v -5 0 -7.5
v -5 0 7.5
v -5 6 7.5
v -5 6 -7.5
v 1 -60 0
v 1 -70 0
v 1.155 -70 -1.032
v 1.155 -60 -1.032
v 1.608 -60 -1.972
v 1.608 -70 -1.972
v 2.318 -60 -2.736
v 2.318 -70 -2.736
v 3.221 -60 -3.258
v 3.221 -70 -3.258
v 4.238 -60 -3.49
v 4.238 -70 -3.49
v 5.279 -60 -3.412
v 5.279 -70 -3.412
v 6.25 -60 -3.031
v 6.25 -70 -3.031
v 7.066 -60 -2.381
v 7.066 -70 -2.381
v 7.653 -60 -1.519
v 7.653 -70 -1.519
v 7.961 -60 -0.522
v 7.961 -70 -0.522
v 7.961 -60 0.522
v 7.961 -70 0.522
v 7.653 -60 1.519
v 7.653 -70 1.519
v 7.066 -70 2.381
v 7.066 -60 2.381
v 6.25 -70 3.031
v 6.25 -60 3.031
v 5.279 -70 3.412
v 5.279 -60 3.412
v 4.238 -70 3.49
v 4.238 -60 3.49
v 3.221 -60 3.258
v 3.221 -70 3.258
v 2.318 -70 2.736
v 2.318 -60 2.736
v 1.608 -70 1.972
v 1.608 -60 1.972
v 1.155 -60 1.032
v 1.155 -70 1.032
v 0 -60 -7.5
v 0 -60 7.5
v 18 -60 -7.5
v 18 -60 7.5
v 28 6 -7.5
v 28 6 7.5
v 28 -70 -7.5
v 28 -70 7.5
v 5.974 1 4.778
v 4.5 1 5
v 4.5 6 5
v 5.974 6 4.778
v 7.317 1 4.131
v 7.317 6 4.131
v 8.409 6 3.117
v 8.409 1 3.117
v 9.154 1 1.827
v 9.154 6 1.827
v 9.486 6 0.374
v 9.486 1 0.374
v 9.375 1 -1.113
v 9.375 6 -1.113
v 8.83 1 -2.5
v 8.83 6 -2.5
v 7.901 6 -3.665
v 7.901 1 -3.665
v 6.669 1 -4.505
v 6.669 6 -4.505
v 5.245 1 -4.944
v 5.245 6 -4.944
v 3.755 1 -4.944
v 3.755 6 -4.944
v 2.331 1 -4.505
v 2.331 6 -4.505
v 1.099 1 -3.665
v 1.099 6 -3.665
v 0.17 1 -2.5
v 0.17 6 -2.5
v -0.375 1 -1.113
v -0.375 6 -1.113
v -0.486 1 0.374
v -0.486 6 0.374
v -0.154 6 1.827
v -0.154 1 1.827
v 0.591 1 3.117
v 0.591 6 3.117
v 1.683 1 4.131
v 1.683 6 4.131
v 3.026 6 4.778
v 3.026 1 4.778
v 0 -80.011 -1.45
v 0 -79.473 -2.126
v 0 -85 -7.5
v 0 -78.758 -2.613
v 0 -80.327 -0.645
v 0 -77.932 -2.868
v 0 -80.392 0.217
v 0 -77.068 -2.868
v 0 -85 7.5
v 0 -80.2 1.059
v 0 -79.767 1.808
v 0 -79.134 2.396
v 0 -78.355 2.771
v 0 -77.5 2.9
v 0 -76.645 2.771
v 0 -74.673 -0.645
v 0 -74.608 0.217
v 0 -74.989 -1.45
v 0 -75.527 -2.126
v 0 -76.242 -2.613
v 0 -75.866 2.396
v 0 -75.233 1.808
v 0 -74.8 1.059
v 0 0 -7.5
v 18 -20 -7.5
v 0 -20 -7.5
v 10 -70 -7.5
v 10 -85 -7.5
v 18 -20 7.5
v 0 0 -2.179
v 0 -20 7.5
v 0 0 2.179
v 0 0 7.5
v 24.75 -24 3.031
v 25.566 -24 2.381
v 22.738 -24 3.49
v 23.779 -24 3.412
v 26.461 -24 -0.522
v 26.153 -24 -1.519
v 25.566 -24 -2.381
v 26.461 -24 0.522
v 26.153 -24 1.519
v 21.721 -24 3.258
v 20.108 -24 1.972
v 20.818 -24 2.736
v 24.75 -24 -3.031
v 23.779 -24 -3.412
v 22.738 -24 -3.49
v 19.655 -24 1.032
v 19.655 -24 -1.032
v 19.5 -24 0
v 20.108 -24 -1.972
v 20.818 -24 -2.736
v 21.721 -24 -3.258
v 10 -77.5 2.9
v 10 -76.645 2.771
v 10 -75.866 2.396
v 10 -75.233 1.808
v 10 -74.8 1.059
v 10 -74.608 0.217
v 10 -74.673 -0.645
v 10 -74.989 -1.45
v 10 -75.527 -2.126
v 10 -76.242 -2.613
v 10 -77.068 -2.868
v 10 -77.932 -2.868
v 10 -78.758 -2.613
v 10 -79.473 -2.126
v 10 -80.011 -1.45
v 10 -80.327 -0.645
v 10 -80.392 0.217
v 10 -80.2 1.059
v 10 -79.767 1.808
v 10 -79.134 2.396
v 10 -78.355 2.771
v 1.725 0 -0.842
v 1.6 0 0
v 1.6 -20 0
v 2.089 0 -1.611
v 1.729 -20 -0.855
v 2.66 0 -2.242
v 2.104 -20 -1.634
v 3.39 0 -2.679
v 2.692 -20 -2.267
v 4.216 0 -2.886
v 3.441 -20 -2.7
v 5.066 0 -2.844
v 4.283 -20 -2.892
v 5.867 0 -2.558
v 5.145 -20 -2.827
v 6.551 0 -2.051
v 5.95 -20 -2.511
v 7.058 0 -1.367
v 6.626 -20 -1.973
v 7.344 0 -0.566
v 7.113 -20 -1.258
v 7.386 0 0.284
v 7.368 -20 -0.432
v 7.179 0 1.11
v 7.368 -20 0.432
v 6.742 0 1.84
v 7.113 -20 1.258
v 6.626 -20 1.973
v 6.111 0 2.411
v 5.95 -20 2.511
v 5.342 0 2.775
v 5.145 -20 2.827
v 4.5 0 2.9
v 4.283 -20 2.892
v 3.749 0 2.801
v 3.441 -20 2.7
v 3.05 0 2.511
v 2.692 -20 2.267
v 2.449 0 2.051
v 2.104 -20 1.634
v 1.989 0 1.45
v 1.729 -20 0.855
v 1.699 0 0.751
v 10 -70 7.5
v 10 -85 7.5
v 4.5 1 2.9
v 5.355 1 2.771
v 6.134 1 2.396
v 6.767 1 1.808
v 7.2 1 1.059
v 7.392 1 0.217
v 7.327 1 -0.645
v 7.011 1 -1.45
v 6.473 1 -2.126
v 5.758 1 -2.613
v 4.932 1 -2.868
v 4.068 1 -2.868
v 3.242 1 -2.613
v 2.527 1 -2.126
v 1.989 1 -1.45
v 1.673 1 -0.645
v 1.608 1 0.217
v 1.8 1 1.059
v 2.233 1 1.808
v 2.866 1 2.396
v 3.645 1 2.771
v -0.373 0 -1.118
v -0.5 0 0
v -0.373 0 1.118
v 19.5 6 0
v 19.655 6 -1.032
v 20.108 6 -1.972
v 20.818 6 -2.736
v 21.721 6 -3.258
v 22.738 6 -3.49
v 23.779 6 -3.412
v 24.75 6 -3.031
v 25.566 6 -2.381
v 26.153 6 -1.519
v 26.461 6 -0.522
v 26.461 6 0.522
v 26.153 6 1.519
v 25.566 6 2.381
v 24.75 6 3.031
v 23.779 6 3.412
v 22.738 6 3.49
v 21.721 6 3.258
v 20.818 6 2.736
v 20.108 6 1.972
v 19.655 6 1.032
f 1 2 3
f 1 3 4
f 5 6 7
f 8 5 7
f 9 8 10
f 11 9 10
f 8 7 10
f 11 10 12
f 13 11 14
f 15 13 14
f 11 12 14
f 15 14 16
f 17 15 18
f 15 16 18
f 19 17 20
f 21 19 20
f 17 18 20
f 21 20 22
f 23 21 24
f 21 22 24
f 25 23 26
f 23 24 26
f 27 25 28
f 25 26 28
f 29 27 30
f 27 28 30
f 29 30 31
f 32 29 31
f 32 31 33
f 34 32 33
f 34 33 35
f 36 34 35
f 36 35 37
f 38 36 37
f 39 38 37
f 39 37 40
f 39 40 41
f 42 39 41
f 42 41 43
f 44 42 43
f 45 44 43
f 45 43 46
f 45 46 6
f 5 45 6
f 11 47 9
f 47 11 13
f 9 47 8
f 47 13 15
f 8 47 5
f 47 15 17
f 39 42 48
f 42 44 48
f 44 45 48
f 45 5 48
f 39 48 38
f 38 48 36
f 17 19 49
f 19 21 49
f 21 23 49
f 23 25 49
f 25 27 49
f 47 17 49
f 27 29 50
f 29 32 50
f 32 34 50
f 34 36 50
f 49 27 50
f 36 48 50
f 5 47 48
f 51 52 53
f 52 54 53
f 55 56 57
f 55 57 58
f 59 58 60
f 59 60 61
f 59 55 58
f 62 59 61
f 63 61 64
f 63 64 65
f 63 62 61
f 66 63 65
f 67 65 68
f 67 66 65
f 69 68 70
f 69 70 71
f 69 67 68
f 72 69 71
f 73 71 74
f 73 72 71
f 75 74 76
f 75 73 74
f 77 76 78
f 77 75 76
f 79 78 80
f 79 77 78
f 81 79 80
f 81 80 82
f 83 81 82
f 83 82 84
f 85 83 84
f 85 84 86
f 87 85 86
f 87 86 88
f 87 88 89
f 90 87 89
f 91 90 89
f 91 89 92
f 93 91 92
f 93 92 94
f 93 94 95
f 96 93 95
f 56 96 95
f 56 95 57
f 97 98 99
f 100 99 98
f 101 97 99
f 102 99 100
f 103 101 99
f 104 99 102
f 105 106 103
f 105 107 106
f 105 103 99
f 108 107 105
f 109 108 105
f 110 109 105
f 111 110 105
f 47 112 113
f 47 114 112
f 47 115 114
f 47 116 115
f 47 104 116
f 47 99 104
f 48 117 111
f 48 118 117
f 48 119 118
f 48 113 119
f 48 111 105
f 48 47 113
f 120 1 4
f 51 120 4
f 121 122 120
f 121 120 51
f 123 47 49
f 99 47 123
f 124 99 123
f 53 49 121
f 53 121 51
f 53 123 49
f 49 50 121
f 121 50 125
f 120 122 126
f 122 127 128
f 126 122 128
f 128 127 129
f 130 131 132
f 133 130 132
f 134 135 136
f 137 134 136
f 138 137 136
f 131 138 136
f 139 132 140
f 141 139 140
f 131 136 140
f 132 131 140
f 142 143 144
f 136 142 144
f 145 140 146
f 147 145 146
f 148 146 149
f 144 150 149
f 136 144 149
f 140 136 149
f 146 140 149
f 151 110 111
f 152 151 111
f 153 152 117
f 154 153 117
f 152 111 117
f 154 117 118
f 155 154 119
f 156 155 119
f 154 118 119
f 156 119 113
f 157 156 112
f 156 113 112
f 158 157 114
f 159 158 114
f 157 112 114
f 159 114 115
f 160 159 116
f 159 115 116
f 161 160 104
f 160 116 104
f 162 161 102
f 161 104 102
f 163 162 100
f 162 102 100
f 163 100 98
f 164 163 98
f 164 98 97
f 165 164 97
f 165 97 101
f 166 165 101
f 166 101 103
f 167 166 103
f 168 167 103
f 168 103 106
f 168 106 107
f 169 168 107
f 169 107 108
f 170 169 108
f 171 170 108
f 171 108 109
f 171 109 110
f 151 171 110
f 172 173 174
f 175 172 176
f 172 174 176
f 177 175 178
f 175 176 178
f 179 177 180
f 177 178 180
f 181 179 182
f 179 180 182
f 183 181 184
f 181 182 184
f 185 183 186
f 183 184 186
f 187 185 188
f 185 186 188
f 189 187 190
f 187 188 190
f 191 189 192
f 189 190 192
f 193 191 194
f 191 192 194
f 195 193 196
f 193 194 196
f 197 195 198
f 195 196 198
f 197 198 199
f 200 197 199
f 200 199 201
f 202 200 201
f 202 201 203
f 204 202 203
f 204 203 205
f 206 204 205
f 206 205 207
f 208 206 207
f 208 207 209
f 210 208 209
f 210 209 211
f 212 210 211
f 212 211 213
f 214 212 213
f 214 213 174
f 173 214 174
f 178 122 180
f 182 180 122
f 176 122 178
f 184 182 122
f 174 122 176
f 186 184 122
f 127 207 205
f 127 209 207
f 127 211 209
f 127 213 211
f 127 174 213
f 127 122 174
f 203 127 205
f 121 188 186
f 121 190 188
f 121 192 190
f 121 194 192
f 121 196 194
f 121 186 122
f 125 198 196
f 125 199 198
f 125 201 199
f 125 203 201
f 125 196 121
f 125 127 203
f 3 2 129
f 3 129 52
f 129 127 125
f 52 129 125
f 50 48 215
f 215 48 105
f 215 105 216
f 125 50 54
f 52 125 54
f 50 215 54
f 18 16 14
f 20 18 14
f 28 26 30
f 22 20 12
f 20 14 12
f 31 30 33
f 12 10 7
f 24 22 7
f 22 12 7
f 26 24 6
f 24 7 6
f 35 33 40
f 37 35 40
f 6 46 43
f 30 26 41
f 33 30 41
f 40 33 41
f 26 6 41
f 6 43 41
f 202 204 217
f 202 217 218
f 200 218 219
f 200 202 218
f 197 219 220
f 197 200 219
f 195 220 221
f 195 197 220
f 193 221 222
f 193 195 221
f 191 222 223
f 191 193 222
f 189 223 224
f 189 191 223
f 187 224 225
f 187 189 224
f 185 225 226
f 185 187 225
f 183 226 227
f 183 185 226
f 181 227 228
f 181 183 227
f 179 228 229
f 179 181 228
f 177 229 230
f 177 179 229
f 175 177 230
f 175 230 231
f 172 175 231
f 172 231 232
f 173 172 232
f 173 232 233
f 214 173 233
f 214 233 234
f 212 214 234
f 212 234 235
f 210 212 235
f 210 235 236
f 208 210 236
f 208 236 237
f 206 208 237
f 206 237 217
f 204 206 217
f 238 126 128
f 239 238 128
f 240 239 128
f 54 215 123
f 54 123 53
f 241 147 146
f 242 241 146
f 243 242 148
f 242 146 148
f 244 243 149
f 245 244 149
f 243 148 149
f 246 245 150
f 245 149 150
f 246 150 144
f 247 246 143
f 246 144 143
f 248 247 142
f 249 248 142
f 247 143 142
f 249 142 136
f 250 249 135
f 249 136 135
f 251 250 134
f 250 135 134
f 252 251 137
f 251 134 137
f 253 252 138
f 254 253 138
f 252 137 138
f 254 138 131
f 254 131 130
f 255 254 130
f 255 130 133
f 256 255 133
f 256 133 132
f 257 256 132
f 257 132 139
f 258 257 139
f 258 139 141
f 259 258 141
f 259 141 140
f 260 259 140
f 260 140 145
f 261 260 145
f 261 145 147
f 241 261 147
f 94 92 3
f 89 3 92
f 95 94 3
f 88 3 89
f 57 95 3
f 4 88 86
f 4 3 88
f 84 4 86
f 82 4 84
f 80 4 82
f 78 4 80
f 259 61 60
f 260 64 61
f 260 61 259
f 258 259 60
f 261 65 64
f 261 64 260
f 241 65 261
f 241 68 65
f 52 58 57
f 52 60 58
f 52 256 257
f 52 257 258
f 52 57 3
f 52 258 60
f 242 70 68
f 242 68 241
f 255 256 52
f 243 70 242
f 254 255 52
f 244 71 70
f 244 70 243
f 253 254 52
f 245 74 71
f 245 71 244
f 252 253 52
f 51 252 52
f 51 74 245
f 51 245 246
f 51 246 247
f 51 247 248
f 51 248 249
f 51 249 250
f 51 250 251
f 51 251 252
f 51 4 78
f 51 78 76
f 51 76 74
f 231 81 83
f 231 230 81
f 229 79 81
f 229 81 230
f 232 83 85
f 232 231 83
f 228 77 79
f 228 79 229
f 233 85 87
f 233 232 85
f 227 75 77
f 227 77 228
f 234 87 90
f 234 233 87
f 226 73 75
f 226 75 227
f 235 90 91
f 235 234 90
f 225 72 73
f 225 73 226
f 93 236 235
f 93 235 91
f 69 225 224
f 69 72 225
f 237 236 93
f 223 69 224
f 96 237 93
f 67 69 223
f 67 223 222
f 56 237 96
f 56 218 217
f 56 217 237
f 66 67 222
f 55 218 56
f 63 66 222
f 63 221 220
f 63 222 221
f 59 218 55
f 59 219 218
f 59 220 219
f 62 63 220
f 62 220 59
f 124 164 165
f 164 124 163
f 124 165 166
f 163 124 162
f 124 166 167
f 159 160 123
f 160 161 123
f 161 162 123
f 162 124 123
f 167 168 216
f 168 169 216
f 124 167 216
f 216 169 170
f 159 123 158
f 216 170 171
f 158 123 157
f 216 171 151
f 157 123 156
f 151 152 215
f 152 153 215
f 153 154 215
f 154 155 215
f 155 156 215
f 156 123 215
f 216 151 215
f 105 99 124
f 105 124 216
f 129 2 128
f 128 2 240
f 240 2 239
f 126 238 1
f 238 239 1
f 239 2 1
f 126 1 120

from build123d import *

# Parameters (mm, degrees)
BOSS_EXTRUDE1_DEPTH          = 7.5
CUT_EXTRUDE1_REACH           = 158.924
SKETCH2_W                    = 18
SKETCH2_H                    = 40
M5_CLEARANCE_HOLE1_D         = 5.8
CUT_EXTRUDE2_REACH           = 158.924
F_7_0_7_DIAMETER_HOLE1_D     = 7
F_7_0_7_DIAMETER_HOLE1_DEPTH = 20
MOVE_FACE1_BY                = 0.6
CUT_EXTRUDE3_REACH           = 141.732
SKETCH14_W                   = 15
SKETCH14_H                   = 15
BOSS_EXTRUDE2_DEPTH          = 10
M5_CLEARANCE_HOLE2_D         = 5.8
SKETCH18_W                   = 33
SKETCH18_H                   = 15
SKETCH18_R                   = 5
BOSS_EXTRUDE3_DEPTH          = 6
SKETCH19_R                   = 5
SKETCH19_R_2                 = 2.9
BOSS_EXTRUDE4_DEPTH          = 1
F_7_0_7_DIAMETER_HOLE2_D     = 7
F_7_0_7_DIAMETER_HOLE2_DEPTH = 30


with BuildPart() as part:
    # Sketch1 → Boss-Extrude1 (new, symmetric)
    with BuildSketch(Plane.XY):
        Polygon((0, 0), (120, 0), (0, -100), align=None)
    extrude(amount=BOSS_EXTRUDE1_DEPTH, both=True)

    # Sketch2 → Cut-Extrude1 (cut, up to next)
    with BuildSketch(Plane.XY.offset(7.5), mode=Mode.PRIVATE) as cut_extrude1_sk1:
        with Locations((9, -40)):
            Rectangle(SKETCH2_W, SKETCH2_H)
    cut_extrude1_tool1 = extrude(cut_extrude1_sk1.sketch, amount=-CUT_EXTRUDE1_REACH, mode=Mode.PRIVATE) & part.part
    add(cut_extrude1_tool1.solids().sort_by_distance((9, -40, 7.5))[0], mode=Mode.SUBTRACT)

    # M5 Clearance Hole1 (through all)
    with Locations(Plane(origin=(0, 0, 0), x_dir=(1, 0, 0), z_dir=(0, 1, 0))):
        with Locations((4.5, 0)):
            Hole(M5_CLEARANCE_HOLE1_D / 2)

    # Sketch8 → Cut-Extrude2 (cut, up to next)
    with BuildSketch(Plane.XY.offset(7.5), mode=Mode.PRIVATE) as cut_extrude2_sk1:
        Polygon((0, -70), (36, -70), (0, -100), align=None)
    cut_extrude2_tool1 = extrude(cut_extrude2_sk1.sketch, amount=-CUT_EXTRUDE2_REACH, mode=Mode.PRIVATE) & part.part
    add(cut_extrude2_tool1.solids().sort_by_distance((12, -80, 7.5))[0], mode=Mode.SUBTRACT)

    # Ø7.0 (7) Diameter Hole1
    with Locations(Plane(origin=(0, 0, 0), x_dir=(1, 0, 0), z_dir=(0, 1, 0))):
        with Locations((60, 0)):
            Hole(F_7_0_7_DIAMETER_HOLE1_D / 2, depth=F_7_0_7_DIAMETER_HOLE1_DEPTH)

    # Move Face1: a curved face moved inward by 0.6
    add(Solid.thicken(part.faces().sort_by_distance((7.4, -65, 0))[0], -MOVE_FACE1_BY), mode=Mode.SUBTRACT)

    # Sketch13 → Cut-Extrude3 (cut, up to next)
    with BuildSketch(Plane.XY.offset(7.5), mode=Mode.PRIVATE) as cut_extrude3_sk1:
        Polygon((28, 0), (28, -70), (36, -70), (120, 0), align=None)
    cut_extrude3_tool1 = extrude(cut_extrude3_sk1.sketch, amount=-CUT_EXTRUDE3_REACH, mode=Mode.PRIVATE) & part.part
    add(cut_extrude3_tool1.solids().sort_by_distance((58.88, -25.2, 7.5))[0], mode=Mode.SUBTRACT)

    # Sketch14 → Boss-Extrude2 (add)
    with BuildSketch(Plane.ZY):
        with Locations((0, -77.5)):
            Rectangle(SKETCH14_W, SKETCH14_H)
    extrude(amount=-BOSS_EXTRUDE2_DEPTH)

    # M5 Clearance Hole2 (through all)
    with Locations(Plane(origin=(10, 0, 0), x_dir=(0, 0, -1), z_dir=(1, 0, 0))):
        with Locations((0, -77.5)):
            Hole(M5_CLEARANCE_HOLE2_D / 2)



with BuildPart() as body_2:
    # Sketch18 → Boss-Extrude3 (new body)
    with BuildSketch(Plane(origin=(0, 0, 0), x_dir=(1, 0, 0), z_dir=(0, 1, 0))):
        with Locations((11.5, 0)):
            Rectangle(SKETCH18_W, SKETCH18_H)
        with Locations(Location((4.5, 0, 0), (0, 0, 270))):
            Circle(SKETCH18_R, mode=Mode.SUBTRACT)
    extrude(amount=BOSS_EXTRUDE3_DEPTH)


with BuildPart() as part_1:
    add(part.part)

    add(body_2.part)  # Boss-Extrude4 merges body 2
    # Sketch19 → Boss-Extrude4 (add)
    with BuildSketch(Plane(origin=(0, 0, 0), x_dir=(1, 0, 0), z_dir=(0, 1, 0))):
        with Locations(Location((4.5, 0, 0), (0, 0, 270))):
            Circle(SKETCH19_R)
        with Locations(Location((4.5, 0, 0), (0, 0, 270))):
            Circle(SKETCH19_R_2, mode=Mode.SUBTRACT)
    extrude(amount=BOSS_EXTRUDE4_DEPTH)

    # Ø7.0 (7) Diameter Hole2
    with Locations(Plane(origin=(0, 6, 0), x_dir=(1, 0, 0), z_dir=(0, 1, 0))):
        with Locations((23, 0)):
            Hole(F_7_0_7_DIAMETER_HOLE2_D / 2, depth=F_7_0_7_DIAMETER_HOLE2_DEPTH)


solid = part_1.part
